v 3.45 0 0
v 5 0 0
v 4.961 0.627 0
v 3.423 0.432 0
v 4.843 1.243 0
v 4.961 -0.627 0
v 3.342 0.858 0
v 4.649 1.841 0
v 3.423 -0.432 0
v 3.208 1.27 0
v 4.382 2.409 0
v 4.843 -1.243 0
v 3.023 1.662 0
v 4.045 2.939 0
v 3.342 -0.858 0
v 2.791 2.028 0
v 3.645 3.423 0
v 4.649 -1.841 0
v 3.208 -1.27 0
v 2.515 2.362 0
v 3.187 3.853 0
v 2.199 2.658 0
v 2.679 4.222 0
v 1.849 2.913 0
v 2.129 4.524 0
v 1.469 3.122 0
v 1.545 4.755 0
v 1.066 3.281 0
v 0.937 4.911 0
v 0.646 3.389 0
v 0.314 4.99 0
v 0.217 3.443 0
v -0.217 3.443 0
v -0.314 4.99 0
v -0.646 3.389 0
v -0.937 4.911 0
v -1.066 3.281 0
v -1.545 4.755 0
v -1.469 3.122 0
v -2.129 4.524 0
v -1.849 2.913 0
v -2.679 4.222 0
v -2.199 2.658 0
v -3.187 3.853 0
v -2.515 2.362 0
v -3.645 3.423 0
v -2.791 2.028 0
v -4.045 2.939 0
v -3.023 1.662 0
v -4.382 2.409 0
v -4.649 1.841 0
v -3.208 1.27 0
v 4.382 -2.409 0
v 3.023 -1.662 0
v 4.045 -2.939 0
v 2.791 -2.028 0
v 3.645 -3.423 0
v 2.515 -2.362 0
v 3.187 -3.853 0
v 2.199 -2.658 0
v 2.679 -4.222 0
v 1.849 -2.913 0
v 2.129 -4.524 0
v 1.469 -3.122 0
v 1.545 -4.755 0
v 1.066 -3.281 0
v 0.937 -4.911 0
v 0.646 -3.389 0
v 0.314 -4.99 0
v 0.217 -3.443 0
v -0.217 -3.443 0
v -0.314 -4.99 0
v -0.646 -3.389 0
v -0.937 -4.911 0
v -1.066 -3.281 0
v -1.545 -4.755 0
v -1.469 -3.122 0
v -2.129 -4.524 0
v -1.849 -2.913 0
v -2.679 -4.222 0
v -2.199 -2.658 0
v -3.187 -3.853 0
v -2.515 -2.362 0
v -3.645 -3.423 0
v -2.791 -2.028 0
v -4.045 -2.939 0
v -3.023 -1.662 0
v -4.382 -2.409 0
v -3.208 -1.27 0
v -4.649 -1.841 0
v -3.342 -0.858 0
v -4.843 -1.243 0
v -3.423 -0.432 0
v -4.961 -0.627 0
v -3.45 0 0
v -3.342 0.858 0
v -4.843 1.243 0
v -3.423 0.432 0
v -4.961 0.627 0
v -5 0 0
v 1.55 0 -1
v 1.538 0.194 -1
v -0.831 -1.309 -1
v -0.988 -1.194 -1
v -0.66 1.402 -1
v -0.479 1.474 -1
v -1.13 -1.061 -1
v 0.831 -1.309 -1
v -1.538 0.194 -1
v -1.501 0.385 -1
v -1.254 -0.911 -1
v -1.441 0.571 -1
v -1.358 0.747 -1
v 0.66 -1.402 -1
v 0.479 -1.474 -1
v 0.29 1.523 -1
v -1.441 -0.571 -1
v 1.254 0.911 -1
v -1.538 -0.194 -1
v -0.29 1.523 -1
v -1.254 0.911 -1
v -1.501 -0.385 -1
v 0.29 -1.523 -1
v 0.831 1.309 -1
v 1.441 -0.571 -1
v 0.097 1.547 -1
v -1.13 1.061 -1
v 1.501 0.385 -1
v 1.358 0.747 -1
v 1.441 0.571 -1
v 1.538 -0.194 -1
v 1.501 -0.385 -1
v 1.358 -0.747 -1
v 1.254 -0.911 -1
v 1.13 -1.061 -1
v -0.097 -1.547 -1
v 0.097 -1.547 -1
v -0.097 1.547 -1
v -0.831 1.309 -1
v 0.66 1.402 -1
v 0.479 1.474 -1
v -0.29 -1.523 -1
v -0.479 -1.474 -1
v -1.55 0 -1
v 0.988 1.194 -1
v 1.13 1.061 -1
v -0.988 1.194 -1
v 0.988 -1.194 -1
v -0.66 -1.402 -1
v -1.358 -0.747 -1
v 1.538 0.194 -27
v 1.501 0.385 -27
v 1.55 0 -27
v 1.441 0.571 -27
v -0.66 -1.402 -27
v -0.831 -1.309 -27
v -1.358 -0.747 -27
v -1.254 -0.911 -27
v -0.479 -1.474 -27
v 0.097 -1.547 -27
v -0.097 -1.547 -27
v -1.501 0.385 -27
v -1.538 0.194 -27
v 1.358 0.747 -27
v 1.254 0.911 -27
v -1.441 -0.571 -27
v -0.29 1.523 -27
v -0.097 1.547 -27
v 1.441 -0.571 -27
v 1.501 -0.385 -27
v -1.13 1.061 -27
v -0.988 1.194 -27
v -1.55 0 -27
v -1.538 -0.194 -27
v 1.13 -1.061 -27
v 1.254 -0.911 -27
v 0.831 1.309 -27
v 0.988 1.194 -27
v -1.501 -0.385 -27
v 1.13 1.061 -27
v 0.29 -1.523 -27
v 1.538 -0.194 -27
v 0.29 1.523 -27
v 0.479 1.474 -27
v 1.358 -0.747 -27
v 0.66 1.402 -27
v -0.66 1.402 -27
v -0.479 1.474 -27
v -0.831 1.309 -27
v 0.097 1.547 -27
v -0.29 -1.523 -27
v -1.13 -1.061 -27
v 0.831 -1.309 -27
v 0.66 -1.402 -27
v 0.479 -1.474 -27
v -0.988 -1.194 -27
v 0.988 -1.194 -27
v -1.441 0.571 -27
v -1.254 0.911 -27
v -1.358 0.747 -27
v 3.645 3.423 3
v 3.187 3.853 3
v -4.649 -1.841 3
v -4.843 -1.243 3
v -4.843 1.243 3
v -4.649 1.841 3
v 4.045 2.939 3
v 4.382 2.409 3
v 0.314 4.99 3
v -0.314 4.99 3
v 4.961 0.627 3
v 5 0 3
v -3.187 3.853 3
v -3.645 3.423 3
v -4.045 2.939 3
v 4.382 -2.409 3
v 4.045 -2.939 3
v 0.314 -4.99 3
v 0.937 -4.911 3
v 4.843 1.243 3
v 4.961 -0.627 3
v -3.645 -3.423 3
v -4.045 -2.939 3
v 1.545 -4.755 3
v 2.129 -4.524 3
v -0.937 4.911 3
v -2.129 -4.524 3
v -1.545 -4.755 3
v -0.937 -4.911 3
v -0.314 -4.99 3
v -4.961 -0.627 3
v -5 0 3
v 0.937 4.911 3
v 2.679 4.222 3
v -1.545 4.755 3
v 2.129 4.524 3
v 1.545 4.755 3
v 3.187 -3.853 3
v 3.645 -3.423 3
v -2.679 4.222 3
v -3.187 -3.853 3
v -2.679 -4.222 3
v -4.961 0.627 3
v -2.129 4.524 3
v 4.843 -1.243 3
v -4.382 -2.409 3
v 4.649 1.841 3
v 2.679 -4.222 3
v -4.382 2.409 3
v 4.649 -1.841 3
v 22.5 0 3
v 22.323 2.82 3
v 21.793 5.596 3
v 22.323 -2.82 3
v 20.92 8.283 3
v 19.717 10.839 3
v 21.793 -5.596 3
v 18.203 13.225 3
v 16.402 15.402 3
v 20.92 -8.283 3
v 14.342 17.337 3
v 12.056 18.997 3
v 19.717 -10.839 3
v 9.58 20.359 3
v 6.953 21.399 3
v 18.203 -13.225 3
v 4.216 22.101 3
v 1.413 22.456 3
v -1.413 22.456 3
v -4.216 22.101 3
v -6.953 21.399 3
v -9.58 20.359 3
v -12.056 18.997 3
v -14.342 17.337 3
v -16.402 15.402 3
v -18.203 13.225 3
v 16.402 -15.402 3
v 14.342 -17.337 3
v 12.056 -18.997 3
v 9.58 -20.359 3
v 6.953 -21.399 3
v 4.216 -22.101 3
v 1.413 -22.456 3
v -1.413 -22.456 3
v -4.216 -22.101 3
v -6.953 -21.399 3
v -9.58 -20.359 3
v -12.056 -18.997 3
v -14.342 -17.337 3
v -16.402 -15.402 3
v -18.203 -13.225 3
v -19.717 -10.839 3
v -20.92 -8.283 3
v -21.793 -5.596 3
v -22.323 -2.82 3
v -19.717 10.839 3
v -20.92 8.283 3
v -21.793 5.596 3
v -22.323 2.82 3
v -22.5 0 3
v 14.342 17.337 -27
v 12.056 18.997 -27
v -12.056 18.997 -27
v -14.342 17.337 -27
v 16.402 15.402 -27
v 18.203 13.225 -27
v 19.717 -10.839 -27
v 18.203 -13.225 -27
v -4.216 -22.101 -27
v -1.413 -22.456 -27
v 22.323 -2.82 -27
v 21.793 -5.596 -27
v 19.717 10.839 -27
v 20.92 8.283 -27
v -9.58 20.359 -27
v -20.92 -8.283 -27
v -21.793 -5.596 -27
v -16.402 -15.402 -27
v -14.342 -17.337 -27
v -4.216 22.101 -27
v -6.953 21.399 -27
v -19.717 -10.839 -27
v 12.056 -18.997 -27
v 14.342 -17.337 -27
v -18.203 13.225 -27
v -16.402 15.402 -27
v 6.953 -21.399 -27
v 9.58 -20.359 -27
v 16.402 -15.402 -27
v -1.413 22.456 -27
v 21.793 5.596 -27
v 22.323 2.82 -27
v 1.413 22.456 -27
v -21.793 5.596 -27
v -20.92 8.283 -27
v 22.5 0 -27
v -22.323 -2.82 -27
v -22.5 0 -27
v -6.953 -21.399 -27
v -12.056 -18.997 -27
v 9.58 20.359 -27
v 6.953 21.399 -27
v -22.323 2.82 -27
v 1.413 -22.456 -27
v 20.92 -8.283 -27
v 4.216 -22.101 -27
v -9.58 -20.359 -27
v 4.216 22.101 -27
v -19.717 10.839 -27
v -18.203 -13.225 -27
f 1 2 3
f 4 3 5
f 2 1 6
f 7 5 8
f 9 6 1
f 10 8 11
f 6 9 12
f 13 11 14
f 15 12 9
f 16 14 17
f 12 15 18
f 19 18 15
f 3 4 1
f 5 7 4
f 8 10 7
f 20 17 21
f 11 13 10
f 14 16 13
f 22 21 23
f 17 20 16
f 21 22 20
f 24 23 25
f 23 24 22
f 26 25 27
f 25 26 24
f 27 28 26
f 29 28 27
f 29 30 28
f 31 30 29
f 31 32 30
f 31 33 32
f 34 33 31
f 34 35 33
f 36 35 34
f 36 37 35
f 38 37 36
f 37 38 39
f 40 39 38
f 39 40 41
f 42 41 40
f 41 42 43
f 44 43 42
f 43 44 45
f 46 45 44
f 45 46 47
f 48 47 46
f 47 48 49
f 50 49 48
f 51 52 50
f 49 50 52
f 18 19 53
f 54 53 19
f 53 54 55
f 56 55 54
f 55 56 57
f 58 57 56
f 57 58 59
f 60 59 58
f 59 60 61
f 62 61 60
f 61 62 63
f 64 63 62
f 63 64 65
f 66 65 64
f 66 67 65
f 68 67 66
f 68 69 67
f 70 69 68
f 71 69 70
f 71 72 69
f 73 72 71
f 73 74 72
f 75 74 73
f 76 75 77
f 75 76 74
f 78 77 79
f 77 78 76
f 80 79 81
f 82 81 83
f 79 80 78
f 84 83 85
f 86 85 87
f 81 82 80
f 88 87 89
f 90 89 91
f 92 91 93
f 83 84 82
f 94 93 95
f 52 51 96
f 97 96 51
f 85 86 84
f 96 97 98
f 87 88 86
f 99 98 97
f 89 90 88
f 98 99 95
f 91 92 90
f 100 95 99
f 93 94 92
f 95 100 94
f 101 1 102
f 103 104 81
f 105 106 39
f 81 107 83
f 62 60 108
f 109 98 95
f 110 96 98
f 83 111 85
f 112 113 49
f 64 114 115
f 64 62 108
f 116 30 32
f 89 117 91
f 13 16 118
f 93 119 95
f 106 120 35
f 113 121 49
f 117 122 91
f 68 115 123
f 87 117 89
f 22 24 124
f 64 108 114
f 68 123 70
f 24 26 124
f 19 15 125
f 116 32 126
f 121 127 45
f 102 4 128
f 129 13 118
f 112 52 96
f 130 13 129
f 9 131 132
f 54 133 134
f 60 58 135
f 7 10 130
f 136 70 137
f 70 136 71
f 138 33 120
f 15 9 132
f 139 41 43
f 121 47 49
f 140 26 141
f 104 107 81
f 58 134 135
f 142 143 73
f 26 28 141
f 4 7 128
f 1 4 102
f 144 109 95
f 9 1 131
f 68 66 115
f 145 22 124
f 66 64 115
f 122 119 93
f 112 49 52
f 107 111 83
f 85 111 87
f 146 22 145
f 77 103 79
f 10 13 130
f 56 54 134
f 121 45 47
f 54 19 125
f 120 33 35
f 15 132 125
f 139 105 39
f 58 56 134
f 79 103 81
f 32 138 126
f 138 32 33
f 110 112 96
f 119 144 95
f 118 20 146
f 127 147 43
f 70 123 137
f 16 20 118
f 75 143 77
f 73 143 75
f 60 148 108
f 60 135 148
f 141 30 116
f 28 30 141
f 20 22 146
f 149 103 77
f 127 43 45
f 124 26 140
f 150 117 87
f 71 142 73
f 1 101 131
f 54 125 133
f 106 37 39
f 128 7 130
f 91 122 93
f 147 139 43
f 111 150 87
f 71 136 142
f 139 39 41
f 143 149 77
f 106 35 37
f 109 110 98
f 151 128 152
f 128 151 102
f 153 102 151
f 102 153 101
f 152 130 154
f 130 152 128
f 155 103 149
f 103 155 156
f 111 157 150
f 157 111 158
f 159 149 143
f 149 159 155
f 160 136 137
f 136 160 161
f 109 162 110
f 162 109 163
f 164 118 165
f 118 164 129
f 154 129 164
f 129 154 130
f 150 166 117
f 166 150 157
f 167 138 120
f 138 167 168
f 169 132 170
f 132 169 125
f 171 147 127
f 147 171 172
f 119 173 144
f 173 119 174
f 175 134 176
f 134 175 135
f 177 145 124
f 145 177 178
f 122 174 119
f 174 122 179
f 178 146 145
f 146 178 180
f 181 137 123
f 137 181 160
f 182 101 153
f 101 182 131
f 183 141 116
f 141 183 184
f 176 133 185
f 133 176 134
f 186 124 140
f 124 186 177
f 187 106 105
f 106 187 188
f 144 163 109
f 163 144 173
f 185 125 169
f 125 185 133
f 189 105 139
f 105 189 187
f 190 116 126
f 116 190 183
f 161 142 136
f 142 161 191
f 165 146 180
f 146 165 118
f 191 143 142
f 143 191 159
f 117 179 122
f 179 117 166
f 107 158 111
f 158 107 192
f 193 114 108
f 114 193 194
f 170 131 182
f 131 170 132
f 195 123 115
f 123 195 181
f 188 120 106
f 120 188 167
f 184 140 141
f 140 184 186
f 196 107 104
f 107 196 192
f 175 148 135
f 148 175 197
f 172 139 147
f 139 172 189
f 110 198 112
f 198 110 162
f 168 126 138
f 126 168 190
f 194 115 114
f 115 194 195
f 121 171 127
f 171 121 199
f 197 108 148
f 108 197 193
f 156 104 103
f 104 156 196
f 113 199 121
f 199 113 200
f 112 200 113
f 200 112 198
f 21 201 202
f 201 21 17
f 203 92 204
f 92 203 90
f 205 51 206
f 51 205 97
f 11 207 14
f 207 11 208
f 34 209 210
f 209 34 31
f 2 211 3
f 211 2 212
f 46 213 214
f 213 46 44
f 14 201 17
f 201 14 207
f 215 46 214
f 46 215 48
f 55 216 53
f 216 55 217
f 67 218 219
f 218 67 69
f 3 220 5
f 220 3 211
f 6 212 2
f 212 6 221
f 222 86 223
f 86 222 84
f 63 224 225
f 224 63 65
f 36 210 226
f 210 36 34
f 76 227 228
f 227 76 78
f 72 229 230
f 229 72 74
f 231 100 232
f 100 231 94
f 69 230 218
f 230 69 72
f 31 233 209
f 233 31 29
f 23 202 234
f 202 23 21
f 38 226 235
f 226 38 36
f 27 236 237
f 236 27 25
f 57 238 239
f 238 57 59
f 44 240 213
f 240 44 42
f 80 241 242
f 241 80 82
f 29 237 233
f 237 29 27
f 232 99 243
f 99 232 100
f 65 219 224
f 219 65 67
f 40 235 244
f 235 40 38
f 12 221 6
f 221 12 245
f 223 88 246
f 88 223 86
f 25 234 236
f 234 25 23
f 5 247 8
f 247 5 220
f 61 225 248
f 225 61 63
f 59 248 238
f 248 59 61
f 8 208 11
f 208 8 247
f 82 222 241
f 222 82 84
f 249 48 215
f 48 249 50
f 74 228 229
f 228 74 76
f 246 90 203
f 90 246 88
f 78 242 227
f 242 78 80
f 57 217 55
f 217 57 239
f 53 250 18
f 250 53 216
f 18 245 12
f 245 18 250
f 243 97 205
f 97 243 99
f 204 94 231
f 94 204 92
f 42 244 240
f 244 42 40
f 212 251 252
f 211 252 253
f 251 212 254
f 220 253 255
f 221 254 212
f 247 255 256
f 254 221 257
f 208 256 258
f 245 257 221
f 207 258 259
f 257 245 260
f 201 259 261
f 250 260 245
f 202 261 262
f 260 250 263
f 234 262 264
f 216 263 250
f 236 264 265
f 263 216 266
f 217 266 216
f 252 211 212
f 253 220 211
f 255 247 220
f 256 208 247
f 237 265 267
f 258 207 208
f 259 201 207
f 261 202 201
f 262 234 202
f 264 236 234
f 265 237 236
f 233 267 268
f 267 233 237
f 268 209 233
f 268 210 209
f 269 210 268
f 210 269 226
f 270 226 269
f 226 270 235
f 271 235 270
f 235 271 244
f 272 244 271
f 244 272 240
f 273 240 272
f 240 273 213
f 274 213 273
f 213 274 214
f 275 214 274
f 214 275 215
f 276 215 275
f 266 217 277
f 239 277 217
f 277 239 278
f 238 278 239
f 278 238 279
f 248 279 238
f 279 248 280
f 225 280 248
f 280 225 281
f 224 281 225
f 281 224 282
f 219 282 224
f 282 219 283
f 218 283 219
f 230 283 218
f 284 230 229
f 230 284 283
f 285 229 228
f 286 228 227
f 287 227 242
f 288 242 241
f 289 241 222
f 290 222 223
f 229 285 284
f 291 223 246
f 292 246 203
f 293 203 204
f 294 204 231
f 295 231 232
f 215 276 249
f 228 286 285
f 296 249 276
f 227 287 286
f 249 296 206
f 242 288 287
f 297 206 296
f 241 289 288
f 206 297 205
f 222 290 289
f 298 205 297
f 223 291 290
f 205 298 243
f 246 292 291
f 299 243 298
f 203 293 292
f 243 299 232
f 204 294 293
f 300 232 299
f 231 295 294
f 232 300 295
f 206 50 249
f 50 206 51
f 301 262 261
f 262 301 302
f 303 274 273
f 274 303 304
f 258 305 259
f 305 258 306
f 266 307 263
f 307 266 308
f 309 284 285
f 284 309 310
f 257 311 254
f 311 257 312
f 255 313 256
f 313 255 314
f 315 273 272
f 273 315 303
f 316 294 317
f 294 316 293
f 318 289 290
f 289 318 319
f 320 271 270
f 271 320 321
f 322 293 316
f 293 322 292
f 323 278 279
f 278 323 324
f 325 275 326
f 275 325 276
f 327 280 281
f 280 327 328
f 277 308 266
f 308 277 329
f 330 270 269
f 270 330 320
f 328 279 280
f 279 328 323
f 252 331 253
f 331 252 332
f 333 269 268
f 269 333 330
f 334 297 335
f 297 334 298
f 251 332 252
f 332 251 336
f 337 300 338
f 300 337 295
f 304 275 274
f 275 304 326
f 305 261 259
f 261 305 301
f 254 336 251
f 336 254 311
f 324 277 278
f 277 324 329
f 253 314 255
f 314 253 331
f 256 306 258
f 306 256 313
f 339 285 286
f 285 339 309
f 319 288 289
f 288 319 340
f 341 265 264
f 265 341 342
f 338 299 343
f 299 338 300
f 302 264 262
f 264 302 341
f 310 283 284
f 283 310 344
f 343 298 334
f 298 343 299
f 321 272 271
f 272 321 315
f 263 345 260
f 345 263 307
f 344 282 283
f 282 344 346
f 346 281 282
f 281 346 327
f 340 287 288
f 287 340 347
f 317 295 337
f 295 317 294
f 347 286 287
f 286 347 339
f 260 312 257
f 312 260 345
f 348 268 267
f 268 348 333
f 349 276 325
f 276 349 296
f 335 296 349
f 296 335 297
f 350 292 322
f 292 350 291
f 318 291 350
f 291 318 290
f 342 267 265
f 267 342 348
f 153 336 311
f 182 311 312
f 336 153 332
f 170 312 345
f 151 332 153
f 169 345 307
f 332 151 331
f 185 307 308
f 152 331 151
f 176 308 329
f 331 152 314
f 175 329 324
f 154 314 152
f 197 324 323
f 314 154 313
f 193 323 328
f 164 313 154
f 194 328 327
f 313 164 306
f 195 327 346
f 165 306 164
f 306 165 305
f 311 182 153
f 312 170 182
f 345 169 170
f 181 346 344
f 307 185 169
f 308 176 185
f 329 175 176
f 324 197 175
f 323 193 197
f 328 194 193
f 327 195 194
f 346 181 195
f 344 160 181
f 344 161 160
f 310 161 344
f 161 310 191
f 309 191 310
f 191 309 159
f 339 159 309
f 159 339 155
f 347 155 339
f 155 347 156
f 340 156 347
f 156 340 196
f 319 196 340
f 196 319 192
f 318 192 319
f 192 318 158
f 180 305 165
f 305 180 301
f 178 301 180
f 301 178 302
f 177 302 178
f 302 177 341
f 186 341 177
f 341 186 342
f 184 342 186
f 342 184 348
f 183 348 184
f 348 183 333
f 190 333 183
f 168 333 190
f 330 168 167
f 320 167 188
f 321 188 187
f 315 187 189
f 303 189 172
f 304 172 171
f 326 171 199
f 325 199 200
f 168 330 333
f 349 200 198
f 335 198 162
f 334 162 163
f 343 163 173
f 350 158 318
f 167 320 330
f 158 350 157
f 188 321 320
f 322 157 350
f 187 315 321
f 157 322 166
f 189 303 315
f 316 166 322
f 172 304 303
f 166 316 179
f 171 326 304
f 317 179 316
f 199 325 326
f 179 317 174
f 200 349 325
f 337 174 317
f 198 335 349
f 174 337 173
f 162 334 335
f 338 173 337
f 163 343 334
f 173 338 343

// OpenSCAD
$fn = 50;


difference() {
	union() {
		translate(v = [0, 0, -27.0000000000]) {
			cylinder(h = 30, r = 22.5000000000);
		}
	}
	union() {
		translate(v = [0, 0, 0]) {
			rotate(a = [0, 0, 0]) {
				difference() {
					union() {
						translate(v = [0, 0, -30.0000000000]) {
							cylinder(h = 30, r = 1.2500000000);
						}
						translate(v = [0, 0, -1.0000000000]) {
							cylinder(h = 1.0000000000, r1 = 1.5500000000, r2 = 3.4500000000);
						}
						translate(v = [0, 0, -30.0000000000]) {
							cylinder(h = 30, r = 1.5500000000);
						}
						translate(v = [0, 0, -30.0000000000]) {
							cylinder(h = 30, r = 1.2500000000);
						}
					}
					union();
				}
			}
		}
		#cylinder(h = 3, r = 5.0000000000);
	}
}
